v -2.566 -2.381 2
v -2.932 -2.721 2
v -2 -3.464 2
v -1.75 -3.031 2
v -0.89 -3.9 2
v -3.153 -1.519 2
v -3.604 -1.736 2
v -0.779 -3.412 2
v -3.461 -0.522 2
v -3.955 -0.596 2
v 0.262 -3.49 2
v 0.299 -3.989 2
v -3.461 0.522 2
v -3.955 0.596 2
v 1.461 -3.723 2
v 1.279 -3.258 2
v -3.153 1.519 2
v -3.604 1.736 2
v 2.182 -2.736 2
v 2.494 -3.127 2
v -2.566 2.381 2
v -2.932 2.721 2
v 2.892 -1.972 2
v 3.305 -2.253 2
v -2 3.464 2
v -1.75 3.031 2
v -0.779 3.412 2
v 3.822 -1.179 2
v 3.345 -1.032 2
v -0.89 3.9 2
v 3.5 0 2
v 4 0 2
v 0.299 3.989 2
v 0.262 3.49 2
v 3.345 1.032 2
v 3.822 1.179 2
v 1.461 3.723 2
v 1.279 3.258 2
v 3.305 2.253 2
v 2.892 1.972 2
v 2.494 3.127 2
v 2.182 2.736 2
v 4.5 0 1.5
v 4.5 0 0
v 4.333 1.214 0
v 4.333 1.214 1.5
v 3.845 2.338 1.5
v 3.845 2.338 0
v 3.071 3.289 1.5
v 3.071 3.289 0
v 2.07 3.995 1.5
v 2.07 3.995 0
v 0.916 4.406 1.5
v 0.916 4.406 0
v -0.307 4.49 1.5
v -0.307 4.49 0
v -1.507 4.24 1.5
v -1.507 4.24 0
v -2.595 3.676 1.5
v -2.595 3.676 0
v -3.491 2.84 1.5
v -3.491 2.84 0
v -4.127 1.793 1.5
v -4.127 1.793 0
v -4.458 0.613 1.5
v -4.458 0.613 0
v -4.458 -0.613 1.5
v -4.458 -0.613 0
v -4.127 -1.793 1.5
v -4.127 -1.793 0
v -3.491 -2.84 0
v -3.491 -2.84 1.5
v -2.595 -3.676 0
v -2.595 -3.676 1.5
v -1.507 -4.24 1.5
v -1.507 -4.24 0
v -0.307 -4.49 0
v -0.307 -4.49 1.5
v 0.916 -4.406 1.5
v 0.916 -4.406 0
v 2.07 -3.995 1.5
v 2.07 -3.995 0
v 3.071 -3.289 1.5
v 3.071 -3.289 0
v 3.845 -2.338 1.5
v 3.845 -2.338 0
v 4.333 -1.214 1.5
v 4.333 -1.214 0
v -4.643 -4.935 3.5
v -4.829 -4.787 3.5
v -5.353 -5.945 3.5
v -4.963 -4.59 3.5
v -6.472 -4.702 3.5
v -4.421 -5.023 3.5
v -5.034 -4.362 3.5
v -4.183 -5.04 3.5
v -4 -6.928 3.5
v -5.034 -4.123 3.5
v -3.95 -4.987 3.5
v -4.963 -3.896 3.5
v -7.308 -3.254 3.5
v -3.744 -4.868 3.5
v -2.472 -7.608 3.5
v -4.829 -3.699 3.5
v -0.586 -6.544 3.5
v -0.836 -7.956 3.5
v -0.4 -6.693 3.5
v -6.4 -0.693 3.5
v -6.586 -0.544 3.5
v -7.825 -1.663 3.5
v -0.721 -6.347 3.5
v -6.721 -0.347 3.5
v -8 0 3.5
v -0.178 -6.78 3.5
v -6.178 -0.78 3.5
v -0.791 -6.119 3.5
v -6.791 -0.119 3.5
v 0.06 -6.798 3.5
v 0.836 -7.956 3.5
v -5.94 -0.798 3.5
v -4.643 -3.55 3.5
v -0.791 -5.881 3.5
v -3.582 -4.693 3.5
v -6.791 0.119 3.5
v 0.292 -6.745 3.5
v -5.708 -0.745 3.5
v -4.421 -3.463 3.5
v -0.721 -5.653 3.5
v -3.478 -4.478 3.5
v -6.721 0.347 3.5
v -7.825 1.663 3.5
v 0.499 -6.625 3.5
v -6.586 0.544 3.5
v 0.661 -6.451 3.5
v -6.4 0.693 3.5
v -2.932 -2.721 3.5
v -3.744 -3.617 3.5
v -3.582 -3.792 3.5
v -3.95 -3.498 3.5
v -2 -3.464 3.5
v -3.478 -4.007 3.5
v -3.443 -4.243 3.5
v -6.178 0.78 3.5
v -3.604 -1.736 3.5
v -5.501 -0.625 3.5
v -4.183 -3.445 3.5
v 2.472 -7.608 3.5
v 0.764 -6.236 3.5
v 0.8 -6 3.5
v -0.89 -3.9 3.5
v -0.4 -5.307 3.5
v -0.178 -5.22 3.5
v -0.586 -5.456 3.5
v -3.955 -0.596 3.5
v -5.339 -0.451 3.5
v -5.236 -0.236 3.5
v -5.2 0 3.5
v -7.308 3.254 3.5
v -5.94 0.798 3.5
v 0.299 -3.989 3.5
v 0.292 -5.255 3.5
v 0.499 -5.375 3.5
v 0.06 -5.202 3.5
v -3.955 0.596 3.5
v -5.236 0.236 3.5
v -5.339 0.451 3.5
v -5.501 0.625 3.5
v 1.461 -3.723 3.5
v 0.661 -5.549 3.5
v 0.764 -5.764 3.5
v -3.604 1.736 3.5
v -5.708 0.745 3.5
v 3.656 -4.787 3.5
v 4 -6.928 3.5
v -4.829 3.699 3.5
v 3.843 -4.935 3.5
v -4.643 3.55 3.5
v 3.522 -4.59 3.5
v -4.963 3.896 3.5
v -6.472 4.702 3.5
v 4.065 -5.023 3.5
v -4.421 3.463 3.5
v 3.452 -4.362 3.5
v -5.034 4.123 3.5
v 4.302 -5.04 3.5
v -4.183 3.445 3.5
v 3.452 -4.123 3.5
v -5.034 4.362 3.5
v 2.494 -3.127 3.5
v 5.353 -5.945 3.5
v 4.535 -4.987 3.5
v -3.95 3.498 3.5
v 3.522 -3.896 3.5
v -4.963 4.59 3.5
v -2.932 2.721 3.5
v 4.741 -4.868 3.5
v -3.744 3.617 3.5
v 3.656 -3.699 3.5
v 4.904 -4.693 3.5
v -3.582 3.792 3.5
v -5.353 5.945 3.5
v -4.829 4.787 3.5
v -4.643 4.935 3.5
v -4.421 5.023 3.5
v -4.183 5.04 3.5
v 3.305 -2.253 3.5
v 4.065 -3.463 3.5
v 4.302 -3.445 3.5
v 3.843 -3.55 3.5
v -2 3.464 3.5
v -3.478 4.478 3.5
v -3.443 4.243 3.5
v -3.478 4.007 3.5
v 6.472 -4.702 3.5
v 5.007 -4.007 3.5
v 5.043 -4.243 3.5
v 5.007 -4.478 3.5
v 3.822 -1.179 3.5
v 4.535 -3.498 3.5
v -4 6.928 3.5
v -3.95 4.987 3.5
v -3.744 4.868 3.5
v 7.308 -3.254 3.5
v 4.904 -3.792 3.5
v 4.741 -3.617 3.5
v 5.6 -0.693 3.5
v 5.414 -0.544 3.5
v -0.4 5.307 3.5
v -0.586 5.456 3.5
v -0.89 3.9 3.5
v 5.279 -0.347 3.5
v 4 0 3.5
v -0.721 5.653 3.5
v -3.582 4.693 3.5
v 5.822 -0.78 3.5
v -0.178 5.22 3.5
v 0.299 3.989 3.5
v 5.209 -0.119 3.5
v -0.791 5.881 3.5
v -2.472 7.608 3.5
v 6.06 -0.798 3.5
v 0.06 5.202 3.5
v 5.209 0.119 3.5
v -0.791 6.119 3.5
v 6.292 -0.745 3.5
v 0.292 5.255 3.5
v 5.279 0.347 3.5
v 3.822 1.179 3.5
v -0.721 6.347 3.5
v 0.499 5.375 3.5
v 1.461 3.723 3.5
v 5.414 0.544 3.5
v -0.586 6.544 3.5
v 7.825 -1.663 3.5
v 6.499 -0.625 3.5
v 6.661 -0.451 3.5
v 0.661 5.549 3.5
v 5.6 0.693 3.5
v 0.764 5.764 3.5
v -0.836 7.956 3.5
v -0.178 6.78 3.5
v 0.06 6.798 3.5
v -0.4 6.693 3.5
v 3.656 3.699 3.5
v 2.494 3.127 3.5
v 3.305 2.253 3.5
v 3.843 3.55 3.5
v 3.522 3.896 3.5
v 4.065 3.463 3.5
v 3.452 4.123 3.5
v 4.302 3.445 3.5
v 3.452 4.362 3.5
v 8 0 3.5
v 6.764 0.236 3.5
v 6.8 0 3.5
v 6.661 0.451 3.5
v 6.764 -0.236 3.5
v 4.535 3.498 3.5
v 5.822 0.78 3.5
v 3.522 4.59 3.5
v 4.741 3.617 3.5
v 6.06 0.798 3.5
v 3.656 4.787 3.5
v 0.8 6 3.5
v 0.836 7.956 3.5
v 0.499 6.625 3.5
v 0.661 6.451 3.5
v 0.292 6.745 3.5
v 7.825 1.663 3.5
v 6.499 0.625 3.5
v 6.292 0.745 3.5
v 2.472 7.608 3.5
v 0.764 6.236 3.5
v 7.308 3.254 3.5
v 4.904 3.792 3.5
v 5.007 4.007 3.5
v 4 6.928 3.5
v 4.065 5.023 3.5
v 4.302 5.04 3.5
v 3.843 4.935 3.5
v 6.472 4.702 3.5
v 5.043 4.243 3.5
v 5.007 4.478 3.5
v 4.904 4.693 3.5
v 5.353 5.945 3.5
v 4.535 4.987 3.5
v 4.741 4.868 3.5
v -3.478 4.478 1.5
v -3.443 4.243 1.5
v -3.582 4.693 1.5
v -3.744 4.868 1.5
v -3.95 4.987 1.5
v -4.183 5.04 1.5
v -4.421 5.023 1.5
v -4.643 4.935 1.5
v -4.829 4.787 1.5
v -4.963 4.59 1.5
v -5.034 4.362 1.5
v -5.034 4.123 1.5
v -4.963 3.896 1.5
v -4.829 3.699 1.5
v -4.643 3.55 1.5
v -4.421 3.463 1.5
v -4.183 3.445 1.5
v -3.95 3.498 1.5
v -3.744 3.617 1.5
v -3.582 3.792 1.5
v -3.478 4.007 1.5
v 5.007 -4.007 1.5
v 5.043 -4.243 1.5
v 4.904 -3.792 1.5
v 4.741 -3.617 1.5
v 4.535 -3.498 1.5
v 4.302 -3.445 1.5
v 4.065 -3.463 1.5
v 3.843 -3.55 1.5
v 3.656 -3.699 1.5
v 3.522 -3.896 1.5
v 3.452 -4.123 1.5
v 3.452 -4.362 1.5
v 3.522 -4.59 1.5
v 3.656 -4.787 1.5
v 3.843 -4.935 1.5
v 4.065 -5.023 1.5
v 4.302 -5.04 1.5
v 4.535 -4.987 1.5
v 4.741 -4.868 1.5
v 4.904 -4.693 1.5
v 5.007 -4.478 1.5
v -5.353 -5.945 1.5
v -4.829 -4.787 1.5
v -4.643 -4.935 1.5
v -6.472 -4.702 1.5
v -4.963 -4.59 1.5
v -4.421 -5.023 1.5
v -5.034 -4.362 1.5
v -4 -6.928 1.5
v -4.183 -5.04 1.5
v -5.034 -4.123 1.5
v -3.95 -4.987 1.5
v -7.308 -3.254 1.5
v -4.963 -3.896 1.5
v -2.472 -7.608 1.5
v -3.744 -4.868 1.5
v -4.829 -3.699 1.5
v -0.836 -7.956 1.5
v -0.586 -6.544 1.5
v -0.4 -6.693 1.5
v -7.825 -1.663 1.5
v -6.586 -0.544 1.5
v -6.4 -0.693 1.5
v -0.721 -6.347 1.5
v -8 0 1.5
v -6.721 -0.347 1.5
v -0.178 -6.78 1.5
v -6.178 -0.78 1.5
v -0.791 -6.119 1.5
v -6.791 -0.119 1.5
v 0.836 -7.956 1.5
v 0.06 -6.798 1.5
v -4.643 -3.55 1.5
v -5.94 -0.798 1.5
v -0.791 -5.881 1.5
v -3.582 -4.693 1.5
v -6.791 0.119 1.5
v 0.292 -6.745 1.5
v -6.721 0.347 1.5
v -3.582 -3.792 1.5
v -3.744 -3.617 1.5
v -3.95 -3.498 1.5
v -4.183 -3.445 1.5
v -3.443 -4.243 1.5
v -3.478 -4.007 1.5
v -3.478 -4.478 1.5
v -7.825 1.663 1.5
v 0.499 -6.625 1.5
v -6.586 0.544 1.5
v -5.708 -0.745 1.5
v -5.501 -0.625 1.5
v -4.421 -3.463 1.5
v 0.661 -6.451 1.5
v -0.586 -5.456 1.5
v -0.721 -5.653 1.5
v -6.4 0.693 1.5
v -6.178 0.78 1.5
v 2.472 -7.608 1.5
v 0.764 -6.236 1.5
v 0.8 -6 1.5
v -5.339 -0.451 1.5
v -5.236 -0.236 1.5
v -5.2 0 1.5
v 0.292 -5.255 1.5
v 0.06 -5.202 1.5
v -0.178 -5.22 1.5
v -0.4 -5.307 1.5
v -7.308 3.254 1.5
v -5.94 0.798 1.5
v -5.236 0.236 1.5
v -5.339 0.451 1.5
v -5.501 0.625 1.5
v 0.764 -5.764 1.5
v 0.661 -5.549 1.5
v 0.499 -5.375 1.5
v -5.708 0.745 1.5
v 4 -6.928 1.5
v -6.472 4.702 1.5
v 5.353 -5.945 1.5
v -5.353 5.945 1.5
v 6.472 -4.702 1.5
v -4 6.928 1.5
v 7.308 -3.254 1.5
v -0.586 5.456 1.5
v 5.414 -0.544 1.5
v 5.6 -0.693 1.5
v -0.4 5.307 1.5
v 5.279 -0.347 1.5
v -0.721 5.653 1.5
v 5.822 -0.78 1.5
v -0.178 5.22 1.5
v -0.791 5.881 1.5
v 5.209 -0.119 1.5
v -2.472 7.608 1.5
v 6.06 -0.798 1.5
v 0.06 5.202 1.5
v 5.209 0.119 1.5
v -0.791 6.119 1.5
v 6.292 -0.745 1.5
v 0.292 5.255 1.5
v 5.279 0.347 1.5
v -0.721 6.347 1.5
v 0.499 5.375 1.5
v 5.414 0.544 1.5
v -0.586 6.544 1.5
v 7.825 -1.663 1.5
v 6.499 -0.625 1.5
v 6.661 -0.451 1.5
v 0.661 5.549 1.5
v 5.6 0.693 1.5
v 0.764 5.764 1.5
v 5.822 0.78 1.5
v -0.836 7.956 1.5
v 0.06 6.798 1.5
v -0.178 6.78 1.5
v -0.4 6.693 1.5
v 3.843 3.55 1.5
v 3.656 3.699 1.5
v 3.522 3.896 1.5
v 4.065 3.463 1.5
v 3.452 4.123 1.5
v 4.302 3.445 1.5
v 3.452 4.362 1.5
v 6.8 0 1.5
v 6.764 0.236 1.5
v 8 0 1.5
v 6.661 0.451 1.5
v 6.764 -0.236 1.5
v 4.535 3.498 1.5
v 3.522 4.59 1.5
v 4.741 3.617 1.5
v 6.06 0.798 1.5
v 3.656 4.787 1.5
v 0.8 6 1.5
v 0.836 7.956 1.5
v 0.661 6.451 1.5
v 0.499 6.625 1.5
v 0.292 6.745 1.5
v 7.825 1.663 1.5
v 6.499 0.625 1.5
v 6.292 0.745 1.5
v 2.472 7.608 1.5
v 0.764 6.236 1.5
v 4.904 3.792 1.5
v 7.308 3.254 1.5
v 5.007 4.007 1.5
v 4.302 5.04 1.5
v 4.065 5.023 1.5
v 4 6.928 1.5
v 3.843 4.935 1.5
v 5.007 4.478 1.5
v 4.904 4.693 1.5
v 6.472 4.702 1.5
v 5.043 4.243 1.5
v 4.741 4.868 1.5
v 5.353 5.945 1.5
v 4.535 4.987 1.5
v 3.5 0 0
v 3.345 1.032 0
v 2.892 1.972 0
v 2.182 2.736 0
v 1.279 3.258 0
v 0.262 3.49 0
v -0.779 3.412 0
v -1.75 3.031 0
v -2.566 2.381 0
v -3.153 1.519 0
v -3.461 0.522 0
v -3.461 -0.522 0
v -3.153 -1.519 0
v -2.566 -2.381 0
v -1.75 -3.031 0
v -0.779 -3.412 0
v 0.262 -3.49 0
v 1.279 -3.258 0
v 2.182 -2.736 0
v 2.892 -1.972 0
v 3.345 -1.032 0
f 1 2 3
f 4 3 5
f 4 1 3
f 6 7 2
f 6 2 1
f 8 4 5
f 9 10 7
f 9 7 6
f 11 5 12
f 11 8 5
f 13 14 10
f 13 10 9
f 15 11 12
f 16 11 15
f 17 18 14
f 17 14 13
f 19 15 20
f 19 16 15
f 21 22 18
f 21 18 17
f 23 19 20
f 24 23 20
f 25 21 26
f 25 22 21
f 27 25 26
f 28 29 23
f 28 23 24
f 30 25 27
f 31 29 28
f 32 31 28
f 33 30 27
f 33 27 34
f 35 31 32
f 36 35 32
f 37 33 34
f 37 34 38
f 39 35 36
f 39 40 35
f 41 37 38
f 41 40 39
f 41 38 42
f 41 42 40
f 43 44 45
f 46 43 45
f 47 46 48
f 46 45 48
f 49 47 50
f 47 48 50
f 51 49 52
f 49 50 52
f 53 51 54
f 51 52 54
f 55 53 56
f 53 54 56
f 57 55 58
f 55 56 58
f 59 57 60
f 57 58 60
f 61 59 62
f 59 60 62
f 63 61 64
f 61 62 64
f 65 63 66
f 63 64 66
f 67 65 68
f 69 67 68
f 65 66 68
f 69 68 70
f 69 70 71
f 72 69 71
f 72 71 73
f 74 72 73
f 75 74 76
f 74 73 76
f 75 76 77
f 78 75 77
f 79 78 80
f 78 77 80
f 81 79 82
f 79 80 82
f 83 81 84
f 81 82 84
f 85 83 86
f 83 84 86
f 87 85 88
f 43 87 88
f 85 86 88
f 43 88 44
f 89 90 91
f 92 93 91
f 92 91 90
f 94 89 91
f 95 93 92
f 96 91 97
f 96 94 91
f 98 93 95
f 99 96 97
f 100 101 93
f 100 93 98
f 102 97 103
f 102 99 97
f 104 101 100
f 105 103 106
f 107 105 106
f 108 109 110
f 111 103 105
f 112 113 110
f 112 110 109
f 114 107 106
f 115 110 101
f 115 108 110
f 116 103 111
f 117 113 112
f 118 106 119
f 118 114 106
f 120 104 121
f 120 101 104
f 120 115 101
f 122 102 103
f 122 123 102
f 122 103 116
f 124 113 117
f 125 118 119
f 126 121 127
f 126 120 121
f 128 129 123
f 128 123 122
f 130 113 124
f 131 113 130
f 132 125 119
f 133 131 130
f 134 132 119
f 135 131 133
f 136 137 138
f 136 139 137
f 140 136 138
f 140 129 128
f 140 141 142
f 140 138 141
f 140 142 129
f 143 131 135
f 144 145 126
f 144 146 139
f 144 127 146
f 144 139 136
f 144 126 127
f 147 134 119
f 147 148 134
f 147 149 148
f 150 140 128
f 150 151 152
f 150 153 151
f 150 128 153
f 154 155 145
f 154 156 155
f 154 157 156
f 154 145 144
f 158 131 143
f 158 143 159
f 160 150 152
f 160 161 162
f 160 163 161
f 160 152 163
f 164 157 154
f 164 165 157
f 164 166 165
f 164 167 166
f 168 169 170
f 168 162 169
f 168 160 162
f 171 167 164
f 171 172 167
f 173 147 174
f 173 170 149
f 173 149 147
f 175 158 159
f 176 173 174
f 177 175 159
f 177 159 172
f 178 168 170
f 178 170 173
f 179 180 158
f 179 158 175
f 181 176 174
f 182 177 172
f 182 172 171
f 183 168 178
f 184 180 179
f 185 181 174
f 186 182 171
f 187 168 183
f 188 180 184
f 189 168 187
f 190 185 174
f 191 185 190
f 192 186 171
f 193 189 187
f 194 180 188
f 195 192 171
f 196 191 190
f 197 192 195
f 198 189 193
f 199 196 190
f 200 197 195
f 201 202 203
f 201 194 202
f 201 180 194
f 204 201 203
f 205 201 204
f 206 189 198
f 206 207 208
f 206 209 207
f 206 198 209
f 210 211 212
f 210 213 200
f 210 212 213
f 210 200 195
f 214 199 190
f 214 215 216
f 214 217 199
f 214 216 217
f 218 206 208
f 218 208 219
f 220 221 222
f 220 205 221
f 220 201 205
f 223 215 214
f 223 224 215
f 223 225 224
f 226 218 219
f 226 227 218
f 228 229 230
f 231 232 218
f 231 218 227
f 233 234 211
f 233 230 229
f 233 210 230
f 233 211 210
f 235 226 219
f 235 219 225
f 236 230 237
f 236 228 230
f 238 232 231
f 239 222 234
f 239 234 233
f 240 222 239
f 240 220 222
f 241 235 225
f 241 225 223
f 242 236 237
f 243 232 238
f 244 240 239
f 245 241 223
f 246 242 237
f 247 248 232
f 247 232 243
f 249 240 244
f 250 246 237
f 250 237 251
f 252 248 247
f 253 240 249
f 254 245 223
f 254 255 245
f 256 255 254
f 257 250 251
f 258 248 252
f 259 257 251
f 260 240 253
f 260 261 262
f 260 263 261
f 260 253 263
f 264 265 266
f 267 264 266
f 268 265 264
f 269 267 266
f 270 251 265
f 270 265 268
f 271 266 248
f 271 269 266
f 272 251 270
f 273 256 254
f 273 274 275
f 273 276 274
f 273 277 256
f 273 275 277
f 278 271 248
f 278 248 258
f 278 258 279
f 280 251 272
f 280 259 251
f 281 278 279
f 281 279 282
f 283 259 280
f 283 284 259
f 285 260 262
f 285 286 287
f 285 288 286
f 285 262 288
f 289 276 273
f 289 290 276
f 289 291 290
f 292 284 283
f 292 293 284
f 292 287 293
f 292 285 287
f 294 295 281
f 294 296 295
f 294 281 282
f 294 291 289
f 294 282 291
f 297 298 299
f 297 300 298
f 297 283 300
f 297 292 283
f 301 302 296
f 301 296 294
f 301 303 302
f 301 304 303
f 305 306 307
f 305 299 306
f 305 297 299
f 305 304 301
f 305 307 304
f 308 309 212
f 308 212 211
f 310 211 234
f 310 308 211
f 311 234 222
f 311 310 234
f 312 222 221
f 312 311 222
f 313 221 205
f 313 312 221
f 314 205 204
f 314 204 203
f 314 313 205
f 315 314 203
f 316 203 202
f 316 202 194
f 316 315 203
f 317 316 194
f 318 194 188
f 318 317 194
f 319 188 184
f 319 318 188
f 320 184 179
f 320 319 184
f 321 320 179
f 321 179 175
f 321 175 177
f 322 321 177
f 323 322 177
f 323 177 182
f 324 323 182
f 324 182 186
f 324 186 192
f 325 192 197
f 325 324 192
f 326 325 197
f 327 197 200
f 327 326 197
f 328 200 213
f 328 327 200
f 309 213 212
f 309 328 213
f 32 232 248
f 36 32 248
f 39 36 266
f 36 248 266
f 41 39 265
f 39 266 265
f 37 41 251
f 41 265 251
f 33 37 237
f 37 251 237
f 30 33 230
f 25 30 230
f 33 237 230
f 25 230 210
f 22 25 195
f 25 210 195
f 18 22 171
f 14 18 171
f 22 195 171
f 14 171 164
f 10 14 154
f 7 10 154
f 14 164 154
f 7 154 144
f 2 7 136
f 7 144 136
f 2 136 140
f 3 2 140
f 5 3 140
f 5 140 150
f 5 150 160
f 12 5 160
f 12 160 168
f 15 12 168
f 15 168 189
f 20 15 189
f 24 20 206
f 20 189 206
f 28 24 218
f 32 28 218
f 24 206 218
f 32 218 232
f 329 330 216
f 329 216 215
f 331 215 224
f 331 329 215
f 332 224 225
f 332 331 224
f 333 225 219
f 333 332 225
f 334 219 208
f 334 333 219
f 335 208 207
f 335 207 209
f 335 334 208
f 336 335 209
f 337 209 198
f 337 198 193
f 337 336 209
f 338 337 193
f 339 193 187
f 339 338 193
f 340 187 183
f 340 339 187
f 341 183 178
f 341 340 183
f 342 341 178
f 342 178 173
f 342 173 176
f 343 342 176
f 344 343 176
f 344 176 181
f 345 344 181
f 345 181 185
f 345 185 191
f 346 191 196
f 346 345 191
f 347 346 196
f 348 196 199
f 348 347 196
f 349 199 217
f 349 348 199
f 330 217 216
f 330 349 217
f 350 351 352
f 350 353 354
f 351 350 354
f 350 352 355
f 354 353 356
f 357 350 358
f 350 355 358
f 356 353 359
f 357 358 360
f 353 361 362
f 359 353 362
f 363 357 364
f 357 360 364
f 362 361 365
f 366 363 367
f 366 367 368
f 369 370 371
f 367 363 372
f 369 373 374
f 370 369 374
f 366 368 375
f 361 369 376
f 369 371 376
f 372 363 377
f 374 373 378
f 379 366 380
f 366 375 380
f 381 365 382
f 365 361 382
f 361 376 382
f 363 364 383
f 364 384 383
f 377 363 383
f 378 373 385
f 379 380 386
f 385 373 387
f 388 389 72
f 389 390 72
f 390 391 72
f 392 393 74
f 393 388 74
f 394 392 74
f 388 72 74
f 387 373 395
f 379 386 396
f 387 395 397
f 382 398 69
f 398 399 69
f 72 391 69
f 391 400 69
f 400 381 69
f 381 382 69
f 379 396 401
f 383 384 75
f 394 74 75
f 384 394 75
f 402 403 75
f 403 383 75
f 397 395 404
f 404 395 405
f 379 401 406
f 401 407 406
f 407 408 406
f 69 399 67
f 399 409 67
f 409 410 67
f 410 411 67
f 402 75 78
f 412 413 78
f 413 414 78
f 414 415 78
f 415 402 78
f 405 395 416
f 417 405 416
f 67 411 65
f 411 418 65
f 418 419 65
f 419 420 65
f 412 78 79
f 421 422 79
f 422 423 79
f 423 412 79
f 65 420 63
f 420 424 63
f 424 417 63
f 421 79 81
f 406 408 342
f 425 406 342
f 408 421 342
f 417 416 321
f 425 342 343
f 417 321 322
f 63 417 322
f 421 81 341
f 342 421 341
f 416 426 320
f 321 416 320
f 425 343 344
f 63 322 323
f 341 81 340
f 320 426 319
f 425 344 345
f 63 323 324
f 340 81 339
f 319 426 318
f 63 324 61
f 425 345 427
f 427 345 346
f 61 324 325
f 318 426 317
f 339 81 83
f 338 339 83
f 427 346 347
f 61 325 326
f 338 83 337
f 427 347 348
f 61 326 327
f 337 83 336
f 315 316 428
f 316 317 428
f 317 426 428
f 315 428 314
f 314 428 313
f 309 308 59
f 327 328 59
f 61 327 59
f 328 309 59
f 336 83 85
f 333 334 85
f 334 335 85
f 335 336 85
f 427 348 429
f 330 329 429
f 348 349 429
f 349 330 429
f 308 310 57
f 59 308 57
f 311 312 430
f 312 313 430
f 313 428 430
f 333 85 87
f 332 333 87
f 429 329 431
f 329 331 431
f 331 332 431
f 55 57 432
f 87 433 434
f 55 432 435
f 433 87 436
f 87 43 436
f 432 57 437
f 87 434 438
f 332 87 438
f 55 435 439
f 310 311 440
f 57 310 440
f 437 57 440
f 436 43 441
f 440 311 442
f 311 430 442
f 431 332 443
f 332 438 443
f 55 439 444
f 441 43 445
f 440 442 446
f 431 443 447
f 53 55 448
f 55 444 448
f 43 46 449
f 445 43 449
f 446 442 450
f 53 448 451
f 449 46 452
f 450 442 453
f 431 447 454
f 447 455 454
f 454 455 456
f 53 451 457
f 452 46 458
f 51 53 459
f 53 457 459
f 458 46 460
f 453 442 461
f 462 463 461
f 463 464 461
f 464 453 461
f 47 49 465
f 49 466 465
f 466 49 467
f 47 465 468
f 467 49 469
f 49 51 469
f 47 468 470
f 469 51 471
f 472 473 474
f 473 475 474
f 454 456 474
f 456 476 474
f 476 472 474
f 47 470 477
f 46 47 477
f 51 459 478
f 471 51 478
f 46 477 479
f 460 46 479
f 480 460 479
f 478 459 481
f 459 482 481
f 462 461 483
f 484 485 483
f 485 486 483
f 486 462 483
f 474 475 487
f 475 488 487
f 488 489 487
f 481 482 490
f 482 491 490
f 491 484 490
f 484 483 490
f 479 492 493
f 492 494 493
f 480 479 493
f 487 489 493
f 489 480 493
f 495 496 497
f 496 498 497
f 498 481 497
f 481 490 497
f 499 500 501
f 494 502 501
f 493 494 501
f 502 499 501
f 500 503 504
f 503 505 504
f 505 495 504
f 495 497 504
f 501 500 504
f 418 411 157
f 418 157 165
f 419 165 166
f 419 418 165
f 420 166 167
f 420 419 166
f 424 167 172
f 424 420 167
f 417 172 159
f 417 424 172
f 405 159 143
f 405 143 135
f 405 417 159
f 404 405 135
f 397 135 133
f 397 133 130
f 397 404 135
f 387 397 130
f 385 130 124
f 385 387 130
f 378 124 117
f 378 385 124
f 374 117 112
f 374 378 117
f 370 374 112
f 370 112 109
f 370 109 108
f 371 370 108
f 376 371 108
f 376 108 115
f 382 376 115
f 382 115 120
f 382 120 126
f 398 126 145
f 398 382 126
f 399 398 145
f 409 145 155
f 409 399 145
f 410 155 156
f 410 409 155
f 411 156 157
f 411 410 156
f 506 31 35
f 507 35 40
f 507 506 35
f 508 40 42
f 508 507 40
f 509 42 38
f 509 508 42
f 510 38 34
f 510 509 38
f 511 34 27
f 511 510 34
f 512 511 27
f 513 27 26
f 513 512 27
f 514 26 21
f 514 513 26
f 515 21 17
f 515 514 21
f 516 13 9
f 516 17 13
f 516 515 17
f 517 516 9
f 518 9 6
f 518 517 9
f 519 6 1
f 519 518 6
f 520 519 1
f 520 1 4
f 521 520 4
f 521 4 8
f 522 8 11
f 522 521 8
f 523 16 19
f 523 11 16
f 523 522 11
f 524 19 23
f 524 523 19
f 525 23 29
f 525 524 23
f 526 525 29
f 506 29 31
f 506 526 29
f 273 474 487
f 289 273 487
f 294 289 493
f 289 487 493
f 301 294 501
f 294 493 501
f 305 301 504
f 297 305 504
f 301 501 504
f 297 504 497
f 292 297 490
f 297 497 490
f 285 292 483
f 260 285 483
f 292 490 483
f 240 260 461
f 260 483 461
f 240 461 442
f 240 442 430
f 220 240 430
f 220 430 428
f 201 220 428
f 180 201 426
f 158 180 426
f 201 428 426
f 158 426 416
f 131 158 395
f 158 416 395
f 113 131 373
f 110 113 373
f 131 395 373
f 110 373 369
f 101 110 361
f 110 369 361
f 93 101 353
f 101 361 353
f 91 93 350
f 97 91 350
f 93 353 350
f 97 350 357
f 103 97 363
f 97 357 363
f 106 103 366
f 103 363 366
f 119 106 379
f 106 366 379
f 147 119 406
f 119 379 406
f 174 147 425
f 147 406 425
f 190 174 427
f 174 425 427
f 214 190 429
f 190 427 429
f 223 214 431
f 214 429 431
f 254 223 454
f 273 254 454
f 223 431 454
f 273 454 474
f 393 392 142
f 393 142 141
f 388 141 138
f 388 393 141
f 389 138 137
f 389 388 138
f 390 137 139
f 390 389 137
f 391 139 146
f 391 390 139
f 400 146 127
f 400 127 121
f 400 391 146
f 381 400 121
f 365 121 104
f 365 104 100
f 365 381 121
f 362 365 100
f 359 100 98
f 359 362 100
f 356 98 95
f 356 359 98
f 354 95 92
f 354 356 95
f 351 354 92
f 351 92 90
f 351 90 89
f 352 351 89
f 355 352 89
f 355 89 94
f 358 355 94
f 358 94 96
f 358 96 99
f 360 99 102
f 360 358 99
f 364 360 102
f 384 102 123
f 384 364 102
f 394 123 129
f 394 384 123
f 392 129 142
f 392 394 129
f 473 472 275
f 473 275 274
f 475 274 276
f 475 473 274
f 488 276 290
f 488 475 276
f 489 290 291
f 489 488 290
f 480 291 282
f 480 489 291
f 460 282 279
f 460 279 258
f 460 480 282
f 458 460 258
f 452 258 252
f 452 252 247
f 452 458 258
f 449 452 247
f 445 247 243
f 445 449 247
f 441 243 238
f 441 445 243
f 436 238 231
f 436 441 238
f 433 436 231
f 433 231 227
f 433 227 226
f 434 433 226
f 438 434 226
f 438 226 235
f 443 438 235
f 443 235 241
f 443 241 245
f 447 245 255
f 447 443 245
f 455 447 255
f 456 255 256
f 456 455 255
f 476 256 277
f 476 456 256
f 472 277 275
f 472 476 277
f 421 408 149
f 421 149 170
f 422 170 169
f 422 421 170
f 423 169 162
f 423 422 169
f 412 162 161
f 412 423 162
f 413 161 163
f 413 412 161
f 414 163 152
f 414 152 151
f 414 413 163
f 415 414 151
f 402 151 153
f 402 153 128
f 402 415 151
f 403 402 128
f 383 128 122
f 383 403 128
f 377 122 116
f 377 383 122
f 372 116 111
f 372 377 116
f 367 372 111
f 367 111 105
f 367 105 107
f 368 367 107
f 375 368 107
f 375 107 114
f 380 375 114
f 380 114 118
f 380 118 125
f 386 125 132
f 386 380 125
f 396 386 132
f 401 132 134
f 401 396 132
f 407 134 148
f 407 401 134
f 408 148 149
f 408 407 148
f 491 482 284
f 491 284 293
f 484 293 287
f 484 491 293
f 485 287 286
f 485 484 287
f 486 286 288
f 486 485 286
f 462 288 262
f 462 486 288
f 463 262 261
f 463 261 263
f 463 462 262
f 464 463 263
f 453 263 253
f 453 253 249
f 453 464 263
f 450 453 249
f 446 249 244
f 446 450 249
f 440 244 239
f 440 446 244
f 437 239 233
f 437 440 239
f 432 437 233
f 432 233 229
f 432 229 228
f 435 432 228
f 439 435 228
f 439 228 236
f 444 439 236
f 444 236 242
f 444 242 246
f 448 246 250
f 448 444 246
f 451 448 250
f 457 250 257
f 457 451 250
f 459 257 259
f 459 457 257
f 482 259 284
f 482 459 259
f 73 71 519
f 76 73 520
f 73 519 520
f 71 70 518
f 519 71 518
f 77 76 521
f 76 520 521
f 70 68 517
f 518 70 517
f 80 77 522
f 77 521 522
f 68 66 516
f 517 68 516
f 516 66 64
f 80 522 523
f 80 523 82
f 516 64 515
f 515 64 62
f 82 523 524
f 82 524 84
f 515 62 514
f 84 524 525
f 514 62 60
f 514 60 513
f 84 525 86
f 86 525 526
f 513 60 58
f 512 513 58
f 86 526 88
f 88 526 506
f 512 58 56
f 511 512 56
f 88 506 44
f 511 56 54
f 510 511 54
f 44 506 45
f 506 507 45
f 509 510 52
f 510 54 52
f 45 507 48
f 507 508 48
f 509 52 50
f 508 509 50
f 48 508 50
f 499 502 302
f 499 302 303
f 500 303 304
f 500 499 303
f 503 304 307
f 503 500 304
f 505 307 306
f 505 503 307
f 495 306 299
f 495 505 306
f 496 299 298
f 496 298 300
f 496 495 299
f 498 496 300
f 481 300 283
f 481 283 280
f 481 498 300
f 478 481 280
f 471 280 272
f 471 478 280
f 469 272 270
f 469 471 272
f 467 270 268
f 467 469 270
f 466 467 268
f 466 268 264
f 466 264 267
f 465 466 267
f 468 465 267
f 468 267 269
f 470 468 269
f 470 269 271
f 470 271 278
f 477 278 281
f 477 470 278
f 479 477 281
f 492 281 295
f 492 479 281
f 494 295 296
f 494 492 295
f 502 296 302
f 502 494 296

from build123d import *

# Parameters (mm, degrees)
F0_R     = 4.5
F0_R_2   = 3.5
F1_DEPTH = 1.5
F2_R     = 8
F2_R_2   = 0.8
F2_R_3   = 4.5
F2_R_4   = 3.5
F3_DEPTH = 2
F4_R     = 4
F5_DEPTH = 1.5


with BuildPart() as f1:
    # F0 (on Top) → F1 (new body)
    with BuildSketch(Plane.XY):
        Circle(F0_R)
        Circle(F0_R_2, mode=Mode.SUBTRACT)
    extrude(amount=F1_DEPTH)

    # F2 (on face) → F3 (join)
    with BuildSketch(Plane.XY.offset(1.5)):
        Circle(F2_R)
        with Locations((-4.2426406871, -4.2426406871)):
            Circle(F2_R_2, mode=Mode.SUBTRACT)
        with Locations((0, -6)):
            Circle(F2_R_2, mode=Mode.SUBTRACT)
        with Locations((4.2426406871, -4.2426406871)):
            Circle(F2_R_2, mode=Mode.SUBTRACT)
        with Locations((-6, 0)):
            Circle(F2_R_2, mode=Mode.SUBTRACT)
        with Locations((-4.2426406871, 4.2426406871)):
            Circle(F2_R_2, mode=Mode.SUBTRACT)
        Circle(F2_R_3, mode=Mode.SUBTRACT)
        with Locations((6, 0)):
            Circle(F2_R_2, mode=Mode.SUBTRACT)
        with Locations((0, 6)):
            Circle(F2_R_2, mode=Mode.SUBTRACT)
        with Locations((4.2426406871, 4.2426406871)):
            Circle(F2_R_2, mode=Mode.SUBTRACT)
        Circle(F2_R_3)
        Circle(F2_R_4, mode=Mode.SUBTRACT)
    extrude(amount=F3_DEPTH)

    # F4 (on face) → F5 (cut)
    with BuildSketch(Plane.XY.offset(3.5)):
        Circle(F4_R)
    extrude(amount=-F5_DEPTH, mode=Mode.SUBTRACT)


solid = f1.part
